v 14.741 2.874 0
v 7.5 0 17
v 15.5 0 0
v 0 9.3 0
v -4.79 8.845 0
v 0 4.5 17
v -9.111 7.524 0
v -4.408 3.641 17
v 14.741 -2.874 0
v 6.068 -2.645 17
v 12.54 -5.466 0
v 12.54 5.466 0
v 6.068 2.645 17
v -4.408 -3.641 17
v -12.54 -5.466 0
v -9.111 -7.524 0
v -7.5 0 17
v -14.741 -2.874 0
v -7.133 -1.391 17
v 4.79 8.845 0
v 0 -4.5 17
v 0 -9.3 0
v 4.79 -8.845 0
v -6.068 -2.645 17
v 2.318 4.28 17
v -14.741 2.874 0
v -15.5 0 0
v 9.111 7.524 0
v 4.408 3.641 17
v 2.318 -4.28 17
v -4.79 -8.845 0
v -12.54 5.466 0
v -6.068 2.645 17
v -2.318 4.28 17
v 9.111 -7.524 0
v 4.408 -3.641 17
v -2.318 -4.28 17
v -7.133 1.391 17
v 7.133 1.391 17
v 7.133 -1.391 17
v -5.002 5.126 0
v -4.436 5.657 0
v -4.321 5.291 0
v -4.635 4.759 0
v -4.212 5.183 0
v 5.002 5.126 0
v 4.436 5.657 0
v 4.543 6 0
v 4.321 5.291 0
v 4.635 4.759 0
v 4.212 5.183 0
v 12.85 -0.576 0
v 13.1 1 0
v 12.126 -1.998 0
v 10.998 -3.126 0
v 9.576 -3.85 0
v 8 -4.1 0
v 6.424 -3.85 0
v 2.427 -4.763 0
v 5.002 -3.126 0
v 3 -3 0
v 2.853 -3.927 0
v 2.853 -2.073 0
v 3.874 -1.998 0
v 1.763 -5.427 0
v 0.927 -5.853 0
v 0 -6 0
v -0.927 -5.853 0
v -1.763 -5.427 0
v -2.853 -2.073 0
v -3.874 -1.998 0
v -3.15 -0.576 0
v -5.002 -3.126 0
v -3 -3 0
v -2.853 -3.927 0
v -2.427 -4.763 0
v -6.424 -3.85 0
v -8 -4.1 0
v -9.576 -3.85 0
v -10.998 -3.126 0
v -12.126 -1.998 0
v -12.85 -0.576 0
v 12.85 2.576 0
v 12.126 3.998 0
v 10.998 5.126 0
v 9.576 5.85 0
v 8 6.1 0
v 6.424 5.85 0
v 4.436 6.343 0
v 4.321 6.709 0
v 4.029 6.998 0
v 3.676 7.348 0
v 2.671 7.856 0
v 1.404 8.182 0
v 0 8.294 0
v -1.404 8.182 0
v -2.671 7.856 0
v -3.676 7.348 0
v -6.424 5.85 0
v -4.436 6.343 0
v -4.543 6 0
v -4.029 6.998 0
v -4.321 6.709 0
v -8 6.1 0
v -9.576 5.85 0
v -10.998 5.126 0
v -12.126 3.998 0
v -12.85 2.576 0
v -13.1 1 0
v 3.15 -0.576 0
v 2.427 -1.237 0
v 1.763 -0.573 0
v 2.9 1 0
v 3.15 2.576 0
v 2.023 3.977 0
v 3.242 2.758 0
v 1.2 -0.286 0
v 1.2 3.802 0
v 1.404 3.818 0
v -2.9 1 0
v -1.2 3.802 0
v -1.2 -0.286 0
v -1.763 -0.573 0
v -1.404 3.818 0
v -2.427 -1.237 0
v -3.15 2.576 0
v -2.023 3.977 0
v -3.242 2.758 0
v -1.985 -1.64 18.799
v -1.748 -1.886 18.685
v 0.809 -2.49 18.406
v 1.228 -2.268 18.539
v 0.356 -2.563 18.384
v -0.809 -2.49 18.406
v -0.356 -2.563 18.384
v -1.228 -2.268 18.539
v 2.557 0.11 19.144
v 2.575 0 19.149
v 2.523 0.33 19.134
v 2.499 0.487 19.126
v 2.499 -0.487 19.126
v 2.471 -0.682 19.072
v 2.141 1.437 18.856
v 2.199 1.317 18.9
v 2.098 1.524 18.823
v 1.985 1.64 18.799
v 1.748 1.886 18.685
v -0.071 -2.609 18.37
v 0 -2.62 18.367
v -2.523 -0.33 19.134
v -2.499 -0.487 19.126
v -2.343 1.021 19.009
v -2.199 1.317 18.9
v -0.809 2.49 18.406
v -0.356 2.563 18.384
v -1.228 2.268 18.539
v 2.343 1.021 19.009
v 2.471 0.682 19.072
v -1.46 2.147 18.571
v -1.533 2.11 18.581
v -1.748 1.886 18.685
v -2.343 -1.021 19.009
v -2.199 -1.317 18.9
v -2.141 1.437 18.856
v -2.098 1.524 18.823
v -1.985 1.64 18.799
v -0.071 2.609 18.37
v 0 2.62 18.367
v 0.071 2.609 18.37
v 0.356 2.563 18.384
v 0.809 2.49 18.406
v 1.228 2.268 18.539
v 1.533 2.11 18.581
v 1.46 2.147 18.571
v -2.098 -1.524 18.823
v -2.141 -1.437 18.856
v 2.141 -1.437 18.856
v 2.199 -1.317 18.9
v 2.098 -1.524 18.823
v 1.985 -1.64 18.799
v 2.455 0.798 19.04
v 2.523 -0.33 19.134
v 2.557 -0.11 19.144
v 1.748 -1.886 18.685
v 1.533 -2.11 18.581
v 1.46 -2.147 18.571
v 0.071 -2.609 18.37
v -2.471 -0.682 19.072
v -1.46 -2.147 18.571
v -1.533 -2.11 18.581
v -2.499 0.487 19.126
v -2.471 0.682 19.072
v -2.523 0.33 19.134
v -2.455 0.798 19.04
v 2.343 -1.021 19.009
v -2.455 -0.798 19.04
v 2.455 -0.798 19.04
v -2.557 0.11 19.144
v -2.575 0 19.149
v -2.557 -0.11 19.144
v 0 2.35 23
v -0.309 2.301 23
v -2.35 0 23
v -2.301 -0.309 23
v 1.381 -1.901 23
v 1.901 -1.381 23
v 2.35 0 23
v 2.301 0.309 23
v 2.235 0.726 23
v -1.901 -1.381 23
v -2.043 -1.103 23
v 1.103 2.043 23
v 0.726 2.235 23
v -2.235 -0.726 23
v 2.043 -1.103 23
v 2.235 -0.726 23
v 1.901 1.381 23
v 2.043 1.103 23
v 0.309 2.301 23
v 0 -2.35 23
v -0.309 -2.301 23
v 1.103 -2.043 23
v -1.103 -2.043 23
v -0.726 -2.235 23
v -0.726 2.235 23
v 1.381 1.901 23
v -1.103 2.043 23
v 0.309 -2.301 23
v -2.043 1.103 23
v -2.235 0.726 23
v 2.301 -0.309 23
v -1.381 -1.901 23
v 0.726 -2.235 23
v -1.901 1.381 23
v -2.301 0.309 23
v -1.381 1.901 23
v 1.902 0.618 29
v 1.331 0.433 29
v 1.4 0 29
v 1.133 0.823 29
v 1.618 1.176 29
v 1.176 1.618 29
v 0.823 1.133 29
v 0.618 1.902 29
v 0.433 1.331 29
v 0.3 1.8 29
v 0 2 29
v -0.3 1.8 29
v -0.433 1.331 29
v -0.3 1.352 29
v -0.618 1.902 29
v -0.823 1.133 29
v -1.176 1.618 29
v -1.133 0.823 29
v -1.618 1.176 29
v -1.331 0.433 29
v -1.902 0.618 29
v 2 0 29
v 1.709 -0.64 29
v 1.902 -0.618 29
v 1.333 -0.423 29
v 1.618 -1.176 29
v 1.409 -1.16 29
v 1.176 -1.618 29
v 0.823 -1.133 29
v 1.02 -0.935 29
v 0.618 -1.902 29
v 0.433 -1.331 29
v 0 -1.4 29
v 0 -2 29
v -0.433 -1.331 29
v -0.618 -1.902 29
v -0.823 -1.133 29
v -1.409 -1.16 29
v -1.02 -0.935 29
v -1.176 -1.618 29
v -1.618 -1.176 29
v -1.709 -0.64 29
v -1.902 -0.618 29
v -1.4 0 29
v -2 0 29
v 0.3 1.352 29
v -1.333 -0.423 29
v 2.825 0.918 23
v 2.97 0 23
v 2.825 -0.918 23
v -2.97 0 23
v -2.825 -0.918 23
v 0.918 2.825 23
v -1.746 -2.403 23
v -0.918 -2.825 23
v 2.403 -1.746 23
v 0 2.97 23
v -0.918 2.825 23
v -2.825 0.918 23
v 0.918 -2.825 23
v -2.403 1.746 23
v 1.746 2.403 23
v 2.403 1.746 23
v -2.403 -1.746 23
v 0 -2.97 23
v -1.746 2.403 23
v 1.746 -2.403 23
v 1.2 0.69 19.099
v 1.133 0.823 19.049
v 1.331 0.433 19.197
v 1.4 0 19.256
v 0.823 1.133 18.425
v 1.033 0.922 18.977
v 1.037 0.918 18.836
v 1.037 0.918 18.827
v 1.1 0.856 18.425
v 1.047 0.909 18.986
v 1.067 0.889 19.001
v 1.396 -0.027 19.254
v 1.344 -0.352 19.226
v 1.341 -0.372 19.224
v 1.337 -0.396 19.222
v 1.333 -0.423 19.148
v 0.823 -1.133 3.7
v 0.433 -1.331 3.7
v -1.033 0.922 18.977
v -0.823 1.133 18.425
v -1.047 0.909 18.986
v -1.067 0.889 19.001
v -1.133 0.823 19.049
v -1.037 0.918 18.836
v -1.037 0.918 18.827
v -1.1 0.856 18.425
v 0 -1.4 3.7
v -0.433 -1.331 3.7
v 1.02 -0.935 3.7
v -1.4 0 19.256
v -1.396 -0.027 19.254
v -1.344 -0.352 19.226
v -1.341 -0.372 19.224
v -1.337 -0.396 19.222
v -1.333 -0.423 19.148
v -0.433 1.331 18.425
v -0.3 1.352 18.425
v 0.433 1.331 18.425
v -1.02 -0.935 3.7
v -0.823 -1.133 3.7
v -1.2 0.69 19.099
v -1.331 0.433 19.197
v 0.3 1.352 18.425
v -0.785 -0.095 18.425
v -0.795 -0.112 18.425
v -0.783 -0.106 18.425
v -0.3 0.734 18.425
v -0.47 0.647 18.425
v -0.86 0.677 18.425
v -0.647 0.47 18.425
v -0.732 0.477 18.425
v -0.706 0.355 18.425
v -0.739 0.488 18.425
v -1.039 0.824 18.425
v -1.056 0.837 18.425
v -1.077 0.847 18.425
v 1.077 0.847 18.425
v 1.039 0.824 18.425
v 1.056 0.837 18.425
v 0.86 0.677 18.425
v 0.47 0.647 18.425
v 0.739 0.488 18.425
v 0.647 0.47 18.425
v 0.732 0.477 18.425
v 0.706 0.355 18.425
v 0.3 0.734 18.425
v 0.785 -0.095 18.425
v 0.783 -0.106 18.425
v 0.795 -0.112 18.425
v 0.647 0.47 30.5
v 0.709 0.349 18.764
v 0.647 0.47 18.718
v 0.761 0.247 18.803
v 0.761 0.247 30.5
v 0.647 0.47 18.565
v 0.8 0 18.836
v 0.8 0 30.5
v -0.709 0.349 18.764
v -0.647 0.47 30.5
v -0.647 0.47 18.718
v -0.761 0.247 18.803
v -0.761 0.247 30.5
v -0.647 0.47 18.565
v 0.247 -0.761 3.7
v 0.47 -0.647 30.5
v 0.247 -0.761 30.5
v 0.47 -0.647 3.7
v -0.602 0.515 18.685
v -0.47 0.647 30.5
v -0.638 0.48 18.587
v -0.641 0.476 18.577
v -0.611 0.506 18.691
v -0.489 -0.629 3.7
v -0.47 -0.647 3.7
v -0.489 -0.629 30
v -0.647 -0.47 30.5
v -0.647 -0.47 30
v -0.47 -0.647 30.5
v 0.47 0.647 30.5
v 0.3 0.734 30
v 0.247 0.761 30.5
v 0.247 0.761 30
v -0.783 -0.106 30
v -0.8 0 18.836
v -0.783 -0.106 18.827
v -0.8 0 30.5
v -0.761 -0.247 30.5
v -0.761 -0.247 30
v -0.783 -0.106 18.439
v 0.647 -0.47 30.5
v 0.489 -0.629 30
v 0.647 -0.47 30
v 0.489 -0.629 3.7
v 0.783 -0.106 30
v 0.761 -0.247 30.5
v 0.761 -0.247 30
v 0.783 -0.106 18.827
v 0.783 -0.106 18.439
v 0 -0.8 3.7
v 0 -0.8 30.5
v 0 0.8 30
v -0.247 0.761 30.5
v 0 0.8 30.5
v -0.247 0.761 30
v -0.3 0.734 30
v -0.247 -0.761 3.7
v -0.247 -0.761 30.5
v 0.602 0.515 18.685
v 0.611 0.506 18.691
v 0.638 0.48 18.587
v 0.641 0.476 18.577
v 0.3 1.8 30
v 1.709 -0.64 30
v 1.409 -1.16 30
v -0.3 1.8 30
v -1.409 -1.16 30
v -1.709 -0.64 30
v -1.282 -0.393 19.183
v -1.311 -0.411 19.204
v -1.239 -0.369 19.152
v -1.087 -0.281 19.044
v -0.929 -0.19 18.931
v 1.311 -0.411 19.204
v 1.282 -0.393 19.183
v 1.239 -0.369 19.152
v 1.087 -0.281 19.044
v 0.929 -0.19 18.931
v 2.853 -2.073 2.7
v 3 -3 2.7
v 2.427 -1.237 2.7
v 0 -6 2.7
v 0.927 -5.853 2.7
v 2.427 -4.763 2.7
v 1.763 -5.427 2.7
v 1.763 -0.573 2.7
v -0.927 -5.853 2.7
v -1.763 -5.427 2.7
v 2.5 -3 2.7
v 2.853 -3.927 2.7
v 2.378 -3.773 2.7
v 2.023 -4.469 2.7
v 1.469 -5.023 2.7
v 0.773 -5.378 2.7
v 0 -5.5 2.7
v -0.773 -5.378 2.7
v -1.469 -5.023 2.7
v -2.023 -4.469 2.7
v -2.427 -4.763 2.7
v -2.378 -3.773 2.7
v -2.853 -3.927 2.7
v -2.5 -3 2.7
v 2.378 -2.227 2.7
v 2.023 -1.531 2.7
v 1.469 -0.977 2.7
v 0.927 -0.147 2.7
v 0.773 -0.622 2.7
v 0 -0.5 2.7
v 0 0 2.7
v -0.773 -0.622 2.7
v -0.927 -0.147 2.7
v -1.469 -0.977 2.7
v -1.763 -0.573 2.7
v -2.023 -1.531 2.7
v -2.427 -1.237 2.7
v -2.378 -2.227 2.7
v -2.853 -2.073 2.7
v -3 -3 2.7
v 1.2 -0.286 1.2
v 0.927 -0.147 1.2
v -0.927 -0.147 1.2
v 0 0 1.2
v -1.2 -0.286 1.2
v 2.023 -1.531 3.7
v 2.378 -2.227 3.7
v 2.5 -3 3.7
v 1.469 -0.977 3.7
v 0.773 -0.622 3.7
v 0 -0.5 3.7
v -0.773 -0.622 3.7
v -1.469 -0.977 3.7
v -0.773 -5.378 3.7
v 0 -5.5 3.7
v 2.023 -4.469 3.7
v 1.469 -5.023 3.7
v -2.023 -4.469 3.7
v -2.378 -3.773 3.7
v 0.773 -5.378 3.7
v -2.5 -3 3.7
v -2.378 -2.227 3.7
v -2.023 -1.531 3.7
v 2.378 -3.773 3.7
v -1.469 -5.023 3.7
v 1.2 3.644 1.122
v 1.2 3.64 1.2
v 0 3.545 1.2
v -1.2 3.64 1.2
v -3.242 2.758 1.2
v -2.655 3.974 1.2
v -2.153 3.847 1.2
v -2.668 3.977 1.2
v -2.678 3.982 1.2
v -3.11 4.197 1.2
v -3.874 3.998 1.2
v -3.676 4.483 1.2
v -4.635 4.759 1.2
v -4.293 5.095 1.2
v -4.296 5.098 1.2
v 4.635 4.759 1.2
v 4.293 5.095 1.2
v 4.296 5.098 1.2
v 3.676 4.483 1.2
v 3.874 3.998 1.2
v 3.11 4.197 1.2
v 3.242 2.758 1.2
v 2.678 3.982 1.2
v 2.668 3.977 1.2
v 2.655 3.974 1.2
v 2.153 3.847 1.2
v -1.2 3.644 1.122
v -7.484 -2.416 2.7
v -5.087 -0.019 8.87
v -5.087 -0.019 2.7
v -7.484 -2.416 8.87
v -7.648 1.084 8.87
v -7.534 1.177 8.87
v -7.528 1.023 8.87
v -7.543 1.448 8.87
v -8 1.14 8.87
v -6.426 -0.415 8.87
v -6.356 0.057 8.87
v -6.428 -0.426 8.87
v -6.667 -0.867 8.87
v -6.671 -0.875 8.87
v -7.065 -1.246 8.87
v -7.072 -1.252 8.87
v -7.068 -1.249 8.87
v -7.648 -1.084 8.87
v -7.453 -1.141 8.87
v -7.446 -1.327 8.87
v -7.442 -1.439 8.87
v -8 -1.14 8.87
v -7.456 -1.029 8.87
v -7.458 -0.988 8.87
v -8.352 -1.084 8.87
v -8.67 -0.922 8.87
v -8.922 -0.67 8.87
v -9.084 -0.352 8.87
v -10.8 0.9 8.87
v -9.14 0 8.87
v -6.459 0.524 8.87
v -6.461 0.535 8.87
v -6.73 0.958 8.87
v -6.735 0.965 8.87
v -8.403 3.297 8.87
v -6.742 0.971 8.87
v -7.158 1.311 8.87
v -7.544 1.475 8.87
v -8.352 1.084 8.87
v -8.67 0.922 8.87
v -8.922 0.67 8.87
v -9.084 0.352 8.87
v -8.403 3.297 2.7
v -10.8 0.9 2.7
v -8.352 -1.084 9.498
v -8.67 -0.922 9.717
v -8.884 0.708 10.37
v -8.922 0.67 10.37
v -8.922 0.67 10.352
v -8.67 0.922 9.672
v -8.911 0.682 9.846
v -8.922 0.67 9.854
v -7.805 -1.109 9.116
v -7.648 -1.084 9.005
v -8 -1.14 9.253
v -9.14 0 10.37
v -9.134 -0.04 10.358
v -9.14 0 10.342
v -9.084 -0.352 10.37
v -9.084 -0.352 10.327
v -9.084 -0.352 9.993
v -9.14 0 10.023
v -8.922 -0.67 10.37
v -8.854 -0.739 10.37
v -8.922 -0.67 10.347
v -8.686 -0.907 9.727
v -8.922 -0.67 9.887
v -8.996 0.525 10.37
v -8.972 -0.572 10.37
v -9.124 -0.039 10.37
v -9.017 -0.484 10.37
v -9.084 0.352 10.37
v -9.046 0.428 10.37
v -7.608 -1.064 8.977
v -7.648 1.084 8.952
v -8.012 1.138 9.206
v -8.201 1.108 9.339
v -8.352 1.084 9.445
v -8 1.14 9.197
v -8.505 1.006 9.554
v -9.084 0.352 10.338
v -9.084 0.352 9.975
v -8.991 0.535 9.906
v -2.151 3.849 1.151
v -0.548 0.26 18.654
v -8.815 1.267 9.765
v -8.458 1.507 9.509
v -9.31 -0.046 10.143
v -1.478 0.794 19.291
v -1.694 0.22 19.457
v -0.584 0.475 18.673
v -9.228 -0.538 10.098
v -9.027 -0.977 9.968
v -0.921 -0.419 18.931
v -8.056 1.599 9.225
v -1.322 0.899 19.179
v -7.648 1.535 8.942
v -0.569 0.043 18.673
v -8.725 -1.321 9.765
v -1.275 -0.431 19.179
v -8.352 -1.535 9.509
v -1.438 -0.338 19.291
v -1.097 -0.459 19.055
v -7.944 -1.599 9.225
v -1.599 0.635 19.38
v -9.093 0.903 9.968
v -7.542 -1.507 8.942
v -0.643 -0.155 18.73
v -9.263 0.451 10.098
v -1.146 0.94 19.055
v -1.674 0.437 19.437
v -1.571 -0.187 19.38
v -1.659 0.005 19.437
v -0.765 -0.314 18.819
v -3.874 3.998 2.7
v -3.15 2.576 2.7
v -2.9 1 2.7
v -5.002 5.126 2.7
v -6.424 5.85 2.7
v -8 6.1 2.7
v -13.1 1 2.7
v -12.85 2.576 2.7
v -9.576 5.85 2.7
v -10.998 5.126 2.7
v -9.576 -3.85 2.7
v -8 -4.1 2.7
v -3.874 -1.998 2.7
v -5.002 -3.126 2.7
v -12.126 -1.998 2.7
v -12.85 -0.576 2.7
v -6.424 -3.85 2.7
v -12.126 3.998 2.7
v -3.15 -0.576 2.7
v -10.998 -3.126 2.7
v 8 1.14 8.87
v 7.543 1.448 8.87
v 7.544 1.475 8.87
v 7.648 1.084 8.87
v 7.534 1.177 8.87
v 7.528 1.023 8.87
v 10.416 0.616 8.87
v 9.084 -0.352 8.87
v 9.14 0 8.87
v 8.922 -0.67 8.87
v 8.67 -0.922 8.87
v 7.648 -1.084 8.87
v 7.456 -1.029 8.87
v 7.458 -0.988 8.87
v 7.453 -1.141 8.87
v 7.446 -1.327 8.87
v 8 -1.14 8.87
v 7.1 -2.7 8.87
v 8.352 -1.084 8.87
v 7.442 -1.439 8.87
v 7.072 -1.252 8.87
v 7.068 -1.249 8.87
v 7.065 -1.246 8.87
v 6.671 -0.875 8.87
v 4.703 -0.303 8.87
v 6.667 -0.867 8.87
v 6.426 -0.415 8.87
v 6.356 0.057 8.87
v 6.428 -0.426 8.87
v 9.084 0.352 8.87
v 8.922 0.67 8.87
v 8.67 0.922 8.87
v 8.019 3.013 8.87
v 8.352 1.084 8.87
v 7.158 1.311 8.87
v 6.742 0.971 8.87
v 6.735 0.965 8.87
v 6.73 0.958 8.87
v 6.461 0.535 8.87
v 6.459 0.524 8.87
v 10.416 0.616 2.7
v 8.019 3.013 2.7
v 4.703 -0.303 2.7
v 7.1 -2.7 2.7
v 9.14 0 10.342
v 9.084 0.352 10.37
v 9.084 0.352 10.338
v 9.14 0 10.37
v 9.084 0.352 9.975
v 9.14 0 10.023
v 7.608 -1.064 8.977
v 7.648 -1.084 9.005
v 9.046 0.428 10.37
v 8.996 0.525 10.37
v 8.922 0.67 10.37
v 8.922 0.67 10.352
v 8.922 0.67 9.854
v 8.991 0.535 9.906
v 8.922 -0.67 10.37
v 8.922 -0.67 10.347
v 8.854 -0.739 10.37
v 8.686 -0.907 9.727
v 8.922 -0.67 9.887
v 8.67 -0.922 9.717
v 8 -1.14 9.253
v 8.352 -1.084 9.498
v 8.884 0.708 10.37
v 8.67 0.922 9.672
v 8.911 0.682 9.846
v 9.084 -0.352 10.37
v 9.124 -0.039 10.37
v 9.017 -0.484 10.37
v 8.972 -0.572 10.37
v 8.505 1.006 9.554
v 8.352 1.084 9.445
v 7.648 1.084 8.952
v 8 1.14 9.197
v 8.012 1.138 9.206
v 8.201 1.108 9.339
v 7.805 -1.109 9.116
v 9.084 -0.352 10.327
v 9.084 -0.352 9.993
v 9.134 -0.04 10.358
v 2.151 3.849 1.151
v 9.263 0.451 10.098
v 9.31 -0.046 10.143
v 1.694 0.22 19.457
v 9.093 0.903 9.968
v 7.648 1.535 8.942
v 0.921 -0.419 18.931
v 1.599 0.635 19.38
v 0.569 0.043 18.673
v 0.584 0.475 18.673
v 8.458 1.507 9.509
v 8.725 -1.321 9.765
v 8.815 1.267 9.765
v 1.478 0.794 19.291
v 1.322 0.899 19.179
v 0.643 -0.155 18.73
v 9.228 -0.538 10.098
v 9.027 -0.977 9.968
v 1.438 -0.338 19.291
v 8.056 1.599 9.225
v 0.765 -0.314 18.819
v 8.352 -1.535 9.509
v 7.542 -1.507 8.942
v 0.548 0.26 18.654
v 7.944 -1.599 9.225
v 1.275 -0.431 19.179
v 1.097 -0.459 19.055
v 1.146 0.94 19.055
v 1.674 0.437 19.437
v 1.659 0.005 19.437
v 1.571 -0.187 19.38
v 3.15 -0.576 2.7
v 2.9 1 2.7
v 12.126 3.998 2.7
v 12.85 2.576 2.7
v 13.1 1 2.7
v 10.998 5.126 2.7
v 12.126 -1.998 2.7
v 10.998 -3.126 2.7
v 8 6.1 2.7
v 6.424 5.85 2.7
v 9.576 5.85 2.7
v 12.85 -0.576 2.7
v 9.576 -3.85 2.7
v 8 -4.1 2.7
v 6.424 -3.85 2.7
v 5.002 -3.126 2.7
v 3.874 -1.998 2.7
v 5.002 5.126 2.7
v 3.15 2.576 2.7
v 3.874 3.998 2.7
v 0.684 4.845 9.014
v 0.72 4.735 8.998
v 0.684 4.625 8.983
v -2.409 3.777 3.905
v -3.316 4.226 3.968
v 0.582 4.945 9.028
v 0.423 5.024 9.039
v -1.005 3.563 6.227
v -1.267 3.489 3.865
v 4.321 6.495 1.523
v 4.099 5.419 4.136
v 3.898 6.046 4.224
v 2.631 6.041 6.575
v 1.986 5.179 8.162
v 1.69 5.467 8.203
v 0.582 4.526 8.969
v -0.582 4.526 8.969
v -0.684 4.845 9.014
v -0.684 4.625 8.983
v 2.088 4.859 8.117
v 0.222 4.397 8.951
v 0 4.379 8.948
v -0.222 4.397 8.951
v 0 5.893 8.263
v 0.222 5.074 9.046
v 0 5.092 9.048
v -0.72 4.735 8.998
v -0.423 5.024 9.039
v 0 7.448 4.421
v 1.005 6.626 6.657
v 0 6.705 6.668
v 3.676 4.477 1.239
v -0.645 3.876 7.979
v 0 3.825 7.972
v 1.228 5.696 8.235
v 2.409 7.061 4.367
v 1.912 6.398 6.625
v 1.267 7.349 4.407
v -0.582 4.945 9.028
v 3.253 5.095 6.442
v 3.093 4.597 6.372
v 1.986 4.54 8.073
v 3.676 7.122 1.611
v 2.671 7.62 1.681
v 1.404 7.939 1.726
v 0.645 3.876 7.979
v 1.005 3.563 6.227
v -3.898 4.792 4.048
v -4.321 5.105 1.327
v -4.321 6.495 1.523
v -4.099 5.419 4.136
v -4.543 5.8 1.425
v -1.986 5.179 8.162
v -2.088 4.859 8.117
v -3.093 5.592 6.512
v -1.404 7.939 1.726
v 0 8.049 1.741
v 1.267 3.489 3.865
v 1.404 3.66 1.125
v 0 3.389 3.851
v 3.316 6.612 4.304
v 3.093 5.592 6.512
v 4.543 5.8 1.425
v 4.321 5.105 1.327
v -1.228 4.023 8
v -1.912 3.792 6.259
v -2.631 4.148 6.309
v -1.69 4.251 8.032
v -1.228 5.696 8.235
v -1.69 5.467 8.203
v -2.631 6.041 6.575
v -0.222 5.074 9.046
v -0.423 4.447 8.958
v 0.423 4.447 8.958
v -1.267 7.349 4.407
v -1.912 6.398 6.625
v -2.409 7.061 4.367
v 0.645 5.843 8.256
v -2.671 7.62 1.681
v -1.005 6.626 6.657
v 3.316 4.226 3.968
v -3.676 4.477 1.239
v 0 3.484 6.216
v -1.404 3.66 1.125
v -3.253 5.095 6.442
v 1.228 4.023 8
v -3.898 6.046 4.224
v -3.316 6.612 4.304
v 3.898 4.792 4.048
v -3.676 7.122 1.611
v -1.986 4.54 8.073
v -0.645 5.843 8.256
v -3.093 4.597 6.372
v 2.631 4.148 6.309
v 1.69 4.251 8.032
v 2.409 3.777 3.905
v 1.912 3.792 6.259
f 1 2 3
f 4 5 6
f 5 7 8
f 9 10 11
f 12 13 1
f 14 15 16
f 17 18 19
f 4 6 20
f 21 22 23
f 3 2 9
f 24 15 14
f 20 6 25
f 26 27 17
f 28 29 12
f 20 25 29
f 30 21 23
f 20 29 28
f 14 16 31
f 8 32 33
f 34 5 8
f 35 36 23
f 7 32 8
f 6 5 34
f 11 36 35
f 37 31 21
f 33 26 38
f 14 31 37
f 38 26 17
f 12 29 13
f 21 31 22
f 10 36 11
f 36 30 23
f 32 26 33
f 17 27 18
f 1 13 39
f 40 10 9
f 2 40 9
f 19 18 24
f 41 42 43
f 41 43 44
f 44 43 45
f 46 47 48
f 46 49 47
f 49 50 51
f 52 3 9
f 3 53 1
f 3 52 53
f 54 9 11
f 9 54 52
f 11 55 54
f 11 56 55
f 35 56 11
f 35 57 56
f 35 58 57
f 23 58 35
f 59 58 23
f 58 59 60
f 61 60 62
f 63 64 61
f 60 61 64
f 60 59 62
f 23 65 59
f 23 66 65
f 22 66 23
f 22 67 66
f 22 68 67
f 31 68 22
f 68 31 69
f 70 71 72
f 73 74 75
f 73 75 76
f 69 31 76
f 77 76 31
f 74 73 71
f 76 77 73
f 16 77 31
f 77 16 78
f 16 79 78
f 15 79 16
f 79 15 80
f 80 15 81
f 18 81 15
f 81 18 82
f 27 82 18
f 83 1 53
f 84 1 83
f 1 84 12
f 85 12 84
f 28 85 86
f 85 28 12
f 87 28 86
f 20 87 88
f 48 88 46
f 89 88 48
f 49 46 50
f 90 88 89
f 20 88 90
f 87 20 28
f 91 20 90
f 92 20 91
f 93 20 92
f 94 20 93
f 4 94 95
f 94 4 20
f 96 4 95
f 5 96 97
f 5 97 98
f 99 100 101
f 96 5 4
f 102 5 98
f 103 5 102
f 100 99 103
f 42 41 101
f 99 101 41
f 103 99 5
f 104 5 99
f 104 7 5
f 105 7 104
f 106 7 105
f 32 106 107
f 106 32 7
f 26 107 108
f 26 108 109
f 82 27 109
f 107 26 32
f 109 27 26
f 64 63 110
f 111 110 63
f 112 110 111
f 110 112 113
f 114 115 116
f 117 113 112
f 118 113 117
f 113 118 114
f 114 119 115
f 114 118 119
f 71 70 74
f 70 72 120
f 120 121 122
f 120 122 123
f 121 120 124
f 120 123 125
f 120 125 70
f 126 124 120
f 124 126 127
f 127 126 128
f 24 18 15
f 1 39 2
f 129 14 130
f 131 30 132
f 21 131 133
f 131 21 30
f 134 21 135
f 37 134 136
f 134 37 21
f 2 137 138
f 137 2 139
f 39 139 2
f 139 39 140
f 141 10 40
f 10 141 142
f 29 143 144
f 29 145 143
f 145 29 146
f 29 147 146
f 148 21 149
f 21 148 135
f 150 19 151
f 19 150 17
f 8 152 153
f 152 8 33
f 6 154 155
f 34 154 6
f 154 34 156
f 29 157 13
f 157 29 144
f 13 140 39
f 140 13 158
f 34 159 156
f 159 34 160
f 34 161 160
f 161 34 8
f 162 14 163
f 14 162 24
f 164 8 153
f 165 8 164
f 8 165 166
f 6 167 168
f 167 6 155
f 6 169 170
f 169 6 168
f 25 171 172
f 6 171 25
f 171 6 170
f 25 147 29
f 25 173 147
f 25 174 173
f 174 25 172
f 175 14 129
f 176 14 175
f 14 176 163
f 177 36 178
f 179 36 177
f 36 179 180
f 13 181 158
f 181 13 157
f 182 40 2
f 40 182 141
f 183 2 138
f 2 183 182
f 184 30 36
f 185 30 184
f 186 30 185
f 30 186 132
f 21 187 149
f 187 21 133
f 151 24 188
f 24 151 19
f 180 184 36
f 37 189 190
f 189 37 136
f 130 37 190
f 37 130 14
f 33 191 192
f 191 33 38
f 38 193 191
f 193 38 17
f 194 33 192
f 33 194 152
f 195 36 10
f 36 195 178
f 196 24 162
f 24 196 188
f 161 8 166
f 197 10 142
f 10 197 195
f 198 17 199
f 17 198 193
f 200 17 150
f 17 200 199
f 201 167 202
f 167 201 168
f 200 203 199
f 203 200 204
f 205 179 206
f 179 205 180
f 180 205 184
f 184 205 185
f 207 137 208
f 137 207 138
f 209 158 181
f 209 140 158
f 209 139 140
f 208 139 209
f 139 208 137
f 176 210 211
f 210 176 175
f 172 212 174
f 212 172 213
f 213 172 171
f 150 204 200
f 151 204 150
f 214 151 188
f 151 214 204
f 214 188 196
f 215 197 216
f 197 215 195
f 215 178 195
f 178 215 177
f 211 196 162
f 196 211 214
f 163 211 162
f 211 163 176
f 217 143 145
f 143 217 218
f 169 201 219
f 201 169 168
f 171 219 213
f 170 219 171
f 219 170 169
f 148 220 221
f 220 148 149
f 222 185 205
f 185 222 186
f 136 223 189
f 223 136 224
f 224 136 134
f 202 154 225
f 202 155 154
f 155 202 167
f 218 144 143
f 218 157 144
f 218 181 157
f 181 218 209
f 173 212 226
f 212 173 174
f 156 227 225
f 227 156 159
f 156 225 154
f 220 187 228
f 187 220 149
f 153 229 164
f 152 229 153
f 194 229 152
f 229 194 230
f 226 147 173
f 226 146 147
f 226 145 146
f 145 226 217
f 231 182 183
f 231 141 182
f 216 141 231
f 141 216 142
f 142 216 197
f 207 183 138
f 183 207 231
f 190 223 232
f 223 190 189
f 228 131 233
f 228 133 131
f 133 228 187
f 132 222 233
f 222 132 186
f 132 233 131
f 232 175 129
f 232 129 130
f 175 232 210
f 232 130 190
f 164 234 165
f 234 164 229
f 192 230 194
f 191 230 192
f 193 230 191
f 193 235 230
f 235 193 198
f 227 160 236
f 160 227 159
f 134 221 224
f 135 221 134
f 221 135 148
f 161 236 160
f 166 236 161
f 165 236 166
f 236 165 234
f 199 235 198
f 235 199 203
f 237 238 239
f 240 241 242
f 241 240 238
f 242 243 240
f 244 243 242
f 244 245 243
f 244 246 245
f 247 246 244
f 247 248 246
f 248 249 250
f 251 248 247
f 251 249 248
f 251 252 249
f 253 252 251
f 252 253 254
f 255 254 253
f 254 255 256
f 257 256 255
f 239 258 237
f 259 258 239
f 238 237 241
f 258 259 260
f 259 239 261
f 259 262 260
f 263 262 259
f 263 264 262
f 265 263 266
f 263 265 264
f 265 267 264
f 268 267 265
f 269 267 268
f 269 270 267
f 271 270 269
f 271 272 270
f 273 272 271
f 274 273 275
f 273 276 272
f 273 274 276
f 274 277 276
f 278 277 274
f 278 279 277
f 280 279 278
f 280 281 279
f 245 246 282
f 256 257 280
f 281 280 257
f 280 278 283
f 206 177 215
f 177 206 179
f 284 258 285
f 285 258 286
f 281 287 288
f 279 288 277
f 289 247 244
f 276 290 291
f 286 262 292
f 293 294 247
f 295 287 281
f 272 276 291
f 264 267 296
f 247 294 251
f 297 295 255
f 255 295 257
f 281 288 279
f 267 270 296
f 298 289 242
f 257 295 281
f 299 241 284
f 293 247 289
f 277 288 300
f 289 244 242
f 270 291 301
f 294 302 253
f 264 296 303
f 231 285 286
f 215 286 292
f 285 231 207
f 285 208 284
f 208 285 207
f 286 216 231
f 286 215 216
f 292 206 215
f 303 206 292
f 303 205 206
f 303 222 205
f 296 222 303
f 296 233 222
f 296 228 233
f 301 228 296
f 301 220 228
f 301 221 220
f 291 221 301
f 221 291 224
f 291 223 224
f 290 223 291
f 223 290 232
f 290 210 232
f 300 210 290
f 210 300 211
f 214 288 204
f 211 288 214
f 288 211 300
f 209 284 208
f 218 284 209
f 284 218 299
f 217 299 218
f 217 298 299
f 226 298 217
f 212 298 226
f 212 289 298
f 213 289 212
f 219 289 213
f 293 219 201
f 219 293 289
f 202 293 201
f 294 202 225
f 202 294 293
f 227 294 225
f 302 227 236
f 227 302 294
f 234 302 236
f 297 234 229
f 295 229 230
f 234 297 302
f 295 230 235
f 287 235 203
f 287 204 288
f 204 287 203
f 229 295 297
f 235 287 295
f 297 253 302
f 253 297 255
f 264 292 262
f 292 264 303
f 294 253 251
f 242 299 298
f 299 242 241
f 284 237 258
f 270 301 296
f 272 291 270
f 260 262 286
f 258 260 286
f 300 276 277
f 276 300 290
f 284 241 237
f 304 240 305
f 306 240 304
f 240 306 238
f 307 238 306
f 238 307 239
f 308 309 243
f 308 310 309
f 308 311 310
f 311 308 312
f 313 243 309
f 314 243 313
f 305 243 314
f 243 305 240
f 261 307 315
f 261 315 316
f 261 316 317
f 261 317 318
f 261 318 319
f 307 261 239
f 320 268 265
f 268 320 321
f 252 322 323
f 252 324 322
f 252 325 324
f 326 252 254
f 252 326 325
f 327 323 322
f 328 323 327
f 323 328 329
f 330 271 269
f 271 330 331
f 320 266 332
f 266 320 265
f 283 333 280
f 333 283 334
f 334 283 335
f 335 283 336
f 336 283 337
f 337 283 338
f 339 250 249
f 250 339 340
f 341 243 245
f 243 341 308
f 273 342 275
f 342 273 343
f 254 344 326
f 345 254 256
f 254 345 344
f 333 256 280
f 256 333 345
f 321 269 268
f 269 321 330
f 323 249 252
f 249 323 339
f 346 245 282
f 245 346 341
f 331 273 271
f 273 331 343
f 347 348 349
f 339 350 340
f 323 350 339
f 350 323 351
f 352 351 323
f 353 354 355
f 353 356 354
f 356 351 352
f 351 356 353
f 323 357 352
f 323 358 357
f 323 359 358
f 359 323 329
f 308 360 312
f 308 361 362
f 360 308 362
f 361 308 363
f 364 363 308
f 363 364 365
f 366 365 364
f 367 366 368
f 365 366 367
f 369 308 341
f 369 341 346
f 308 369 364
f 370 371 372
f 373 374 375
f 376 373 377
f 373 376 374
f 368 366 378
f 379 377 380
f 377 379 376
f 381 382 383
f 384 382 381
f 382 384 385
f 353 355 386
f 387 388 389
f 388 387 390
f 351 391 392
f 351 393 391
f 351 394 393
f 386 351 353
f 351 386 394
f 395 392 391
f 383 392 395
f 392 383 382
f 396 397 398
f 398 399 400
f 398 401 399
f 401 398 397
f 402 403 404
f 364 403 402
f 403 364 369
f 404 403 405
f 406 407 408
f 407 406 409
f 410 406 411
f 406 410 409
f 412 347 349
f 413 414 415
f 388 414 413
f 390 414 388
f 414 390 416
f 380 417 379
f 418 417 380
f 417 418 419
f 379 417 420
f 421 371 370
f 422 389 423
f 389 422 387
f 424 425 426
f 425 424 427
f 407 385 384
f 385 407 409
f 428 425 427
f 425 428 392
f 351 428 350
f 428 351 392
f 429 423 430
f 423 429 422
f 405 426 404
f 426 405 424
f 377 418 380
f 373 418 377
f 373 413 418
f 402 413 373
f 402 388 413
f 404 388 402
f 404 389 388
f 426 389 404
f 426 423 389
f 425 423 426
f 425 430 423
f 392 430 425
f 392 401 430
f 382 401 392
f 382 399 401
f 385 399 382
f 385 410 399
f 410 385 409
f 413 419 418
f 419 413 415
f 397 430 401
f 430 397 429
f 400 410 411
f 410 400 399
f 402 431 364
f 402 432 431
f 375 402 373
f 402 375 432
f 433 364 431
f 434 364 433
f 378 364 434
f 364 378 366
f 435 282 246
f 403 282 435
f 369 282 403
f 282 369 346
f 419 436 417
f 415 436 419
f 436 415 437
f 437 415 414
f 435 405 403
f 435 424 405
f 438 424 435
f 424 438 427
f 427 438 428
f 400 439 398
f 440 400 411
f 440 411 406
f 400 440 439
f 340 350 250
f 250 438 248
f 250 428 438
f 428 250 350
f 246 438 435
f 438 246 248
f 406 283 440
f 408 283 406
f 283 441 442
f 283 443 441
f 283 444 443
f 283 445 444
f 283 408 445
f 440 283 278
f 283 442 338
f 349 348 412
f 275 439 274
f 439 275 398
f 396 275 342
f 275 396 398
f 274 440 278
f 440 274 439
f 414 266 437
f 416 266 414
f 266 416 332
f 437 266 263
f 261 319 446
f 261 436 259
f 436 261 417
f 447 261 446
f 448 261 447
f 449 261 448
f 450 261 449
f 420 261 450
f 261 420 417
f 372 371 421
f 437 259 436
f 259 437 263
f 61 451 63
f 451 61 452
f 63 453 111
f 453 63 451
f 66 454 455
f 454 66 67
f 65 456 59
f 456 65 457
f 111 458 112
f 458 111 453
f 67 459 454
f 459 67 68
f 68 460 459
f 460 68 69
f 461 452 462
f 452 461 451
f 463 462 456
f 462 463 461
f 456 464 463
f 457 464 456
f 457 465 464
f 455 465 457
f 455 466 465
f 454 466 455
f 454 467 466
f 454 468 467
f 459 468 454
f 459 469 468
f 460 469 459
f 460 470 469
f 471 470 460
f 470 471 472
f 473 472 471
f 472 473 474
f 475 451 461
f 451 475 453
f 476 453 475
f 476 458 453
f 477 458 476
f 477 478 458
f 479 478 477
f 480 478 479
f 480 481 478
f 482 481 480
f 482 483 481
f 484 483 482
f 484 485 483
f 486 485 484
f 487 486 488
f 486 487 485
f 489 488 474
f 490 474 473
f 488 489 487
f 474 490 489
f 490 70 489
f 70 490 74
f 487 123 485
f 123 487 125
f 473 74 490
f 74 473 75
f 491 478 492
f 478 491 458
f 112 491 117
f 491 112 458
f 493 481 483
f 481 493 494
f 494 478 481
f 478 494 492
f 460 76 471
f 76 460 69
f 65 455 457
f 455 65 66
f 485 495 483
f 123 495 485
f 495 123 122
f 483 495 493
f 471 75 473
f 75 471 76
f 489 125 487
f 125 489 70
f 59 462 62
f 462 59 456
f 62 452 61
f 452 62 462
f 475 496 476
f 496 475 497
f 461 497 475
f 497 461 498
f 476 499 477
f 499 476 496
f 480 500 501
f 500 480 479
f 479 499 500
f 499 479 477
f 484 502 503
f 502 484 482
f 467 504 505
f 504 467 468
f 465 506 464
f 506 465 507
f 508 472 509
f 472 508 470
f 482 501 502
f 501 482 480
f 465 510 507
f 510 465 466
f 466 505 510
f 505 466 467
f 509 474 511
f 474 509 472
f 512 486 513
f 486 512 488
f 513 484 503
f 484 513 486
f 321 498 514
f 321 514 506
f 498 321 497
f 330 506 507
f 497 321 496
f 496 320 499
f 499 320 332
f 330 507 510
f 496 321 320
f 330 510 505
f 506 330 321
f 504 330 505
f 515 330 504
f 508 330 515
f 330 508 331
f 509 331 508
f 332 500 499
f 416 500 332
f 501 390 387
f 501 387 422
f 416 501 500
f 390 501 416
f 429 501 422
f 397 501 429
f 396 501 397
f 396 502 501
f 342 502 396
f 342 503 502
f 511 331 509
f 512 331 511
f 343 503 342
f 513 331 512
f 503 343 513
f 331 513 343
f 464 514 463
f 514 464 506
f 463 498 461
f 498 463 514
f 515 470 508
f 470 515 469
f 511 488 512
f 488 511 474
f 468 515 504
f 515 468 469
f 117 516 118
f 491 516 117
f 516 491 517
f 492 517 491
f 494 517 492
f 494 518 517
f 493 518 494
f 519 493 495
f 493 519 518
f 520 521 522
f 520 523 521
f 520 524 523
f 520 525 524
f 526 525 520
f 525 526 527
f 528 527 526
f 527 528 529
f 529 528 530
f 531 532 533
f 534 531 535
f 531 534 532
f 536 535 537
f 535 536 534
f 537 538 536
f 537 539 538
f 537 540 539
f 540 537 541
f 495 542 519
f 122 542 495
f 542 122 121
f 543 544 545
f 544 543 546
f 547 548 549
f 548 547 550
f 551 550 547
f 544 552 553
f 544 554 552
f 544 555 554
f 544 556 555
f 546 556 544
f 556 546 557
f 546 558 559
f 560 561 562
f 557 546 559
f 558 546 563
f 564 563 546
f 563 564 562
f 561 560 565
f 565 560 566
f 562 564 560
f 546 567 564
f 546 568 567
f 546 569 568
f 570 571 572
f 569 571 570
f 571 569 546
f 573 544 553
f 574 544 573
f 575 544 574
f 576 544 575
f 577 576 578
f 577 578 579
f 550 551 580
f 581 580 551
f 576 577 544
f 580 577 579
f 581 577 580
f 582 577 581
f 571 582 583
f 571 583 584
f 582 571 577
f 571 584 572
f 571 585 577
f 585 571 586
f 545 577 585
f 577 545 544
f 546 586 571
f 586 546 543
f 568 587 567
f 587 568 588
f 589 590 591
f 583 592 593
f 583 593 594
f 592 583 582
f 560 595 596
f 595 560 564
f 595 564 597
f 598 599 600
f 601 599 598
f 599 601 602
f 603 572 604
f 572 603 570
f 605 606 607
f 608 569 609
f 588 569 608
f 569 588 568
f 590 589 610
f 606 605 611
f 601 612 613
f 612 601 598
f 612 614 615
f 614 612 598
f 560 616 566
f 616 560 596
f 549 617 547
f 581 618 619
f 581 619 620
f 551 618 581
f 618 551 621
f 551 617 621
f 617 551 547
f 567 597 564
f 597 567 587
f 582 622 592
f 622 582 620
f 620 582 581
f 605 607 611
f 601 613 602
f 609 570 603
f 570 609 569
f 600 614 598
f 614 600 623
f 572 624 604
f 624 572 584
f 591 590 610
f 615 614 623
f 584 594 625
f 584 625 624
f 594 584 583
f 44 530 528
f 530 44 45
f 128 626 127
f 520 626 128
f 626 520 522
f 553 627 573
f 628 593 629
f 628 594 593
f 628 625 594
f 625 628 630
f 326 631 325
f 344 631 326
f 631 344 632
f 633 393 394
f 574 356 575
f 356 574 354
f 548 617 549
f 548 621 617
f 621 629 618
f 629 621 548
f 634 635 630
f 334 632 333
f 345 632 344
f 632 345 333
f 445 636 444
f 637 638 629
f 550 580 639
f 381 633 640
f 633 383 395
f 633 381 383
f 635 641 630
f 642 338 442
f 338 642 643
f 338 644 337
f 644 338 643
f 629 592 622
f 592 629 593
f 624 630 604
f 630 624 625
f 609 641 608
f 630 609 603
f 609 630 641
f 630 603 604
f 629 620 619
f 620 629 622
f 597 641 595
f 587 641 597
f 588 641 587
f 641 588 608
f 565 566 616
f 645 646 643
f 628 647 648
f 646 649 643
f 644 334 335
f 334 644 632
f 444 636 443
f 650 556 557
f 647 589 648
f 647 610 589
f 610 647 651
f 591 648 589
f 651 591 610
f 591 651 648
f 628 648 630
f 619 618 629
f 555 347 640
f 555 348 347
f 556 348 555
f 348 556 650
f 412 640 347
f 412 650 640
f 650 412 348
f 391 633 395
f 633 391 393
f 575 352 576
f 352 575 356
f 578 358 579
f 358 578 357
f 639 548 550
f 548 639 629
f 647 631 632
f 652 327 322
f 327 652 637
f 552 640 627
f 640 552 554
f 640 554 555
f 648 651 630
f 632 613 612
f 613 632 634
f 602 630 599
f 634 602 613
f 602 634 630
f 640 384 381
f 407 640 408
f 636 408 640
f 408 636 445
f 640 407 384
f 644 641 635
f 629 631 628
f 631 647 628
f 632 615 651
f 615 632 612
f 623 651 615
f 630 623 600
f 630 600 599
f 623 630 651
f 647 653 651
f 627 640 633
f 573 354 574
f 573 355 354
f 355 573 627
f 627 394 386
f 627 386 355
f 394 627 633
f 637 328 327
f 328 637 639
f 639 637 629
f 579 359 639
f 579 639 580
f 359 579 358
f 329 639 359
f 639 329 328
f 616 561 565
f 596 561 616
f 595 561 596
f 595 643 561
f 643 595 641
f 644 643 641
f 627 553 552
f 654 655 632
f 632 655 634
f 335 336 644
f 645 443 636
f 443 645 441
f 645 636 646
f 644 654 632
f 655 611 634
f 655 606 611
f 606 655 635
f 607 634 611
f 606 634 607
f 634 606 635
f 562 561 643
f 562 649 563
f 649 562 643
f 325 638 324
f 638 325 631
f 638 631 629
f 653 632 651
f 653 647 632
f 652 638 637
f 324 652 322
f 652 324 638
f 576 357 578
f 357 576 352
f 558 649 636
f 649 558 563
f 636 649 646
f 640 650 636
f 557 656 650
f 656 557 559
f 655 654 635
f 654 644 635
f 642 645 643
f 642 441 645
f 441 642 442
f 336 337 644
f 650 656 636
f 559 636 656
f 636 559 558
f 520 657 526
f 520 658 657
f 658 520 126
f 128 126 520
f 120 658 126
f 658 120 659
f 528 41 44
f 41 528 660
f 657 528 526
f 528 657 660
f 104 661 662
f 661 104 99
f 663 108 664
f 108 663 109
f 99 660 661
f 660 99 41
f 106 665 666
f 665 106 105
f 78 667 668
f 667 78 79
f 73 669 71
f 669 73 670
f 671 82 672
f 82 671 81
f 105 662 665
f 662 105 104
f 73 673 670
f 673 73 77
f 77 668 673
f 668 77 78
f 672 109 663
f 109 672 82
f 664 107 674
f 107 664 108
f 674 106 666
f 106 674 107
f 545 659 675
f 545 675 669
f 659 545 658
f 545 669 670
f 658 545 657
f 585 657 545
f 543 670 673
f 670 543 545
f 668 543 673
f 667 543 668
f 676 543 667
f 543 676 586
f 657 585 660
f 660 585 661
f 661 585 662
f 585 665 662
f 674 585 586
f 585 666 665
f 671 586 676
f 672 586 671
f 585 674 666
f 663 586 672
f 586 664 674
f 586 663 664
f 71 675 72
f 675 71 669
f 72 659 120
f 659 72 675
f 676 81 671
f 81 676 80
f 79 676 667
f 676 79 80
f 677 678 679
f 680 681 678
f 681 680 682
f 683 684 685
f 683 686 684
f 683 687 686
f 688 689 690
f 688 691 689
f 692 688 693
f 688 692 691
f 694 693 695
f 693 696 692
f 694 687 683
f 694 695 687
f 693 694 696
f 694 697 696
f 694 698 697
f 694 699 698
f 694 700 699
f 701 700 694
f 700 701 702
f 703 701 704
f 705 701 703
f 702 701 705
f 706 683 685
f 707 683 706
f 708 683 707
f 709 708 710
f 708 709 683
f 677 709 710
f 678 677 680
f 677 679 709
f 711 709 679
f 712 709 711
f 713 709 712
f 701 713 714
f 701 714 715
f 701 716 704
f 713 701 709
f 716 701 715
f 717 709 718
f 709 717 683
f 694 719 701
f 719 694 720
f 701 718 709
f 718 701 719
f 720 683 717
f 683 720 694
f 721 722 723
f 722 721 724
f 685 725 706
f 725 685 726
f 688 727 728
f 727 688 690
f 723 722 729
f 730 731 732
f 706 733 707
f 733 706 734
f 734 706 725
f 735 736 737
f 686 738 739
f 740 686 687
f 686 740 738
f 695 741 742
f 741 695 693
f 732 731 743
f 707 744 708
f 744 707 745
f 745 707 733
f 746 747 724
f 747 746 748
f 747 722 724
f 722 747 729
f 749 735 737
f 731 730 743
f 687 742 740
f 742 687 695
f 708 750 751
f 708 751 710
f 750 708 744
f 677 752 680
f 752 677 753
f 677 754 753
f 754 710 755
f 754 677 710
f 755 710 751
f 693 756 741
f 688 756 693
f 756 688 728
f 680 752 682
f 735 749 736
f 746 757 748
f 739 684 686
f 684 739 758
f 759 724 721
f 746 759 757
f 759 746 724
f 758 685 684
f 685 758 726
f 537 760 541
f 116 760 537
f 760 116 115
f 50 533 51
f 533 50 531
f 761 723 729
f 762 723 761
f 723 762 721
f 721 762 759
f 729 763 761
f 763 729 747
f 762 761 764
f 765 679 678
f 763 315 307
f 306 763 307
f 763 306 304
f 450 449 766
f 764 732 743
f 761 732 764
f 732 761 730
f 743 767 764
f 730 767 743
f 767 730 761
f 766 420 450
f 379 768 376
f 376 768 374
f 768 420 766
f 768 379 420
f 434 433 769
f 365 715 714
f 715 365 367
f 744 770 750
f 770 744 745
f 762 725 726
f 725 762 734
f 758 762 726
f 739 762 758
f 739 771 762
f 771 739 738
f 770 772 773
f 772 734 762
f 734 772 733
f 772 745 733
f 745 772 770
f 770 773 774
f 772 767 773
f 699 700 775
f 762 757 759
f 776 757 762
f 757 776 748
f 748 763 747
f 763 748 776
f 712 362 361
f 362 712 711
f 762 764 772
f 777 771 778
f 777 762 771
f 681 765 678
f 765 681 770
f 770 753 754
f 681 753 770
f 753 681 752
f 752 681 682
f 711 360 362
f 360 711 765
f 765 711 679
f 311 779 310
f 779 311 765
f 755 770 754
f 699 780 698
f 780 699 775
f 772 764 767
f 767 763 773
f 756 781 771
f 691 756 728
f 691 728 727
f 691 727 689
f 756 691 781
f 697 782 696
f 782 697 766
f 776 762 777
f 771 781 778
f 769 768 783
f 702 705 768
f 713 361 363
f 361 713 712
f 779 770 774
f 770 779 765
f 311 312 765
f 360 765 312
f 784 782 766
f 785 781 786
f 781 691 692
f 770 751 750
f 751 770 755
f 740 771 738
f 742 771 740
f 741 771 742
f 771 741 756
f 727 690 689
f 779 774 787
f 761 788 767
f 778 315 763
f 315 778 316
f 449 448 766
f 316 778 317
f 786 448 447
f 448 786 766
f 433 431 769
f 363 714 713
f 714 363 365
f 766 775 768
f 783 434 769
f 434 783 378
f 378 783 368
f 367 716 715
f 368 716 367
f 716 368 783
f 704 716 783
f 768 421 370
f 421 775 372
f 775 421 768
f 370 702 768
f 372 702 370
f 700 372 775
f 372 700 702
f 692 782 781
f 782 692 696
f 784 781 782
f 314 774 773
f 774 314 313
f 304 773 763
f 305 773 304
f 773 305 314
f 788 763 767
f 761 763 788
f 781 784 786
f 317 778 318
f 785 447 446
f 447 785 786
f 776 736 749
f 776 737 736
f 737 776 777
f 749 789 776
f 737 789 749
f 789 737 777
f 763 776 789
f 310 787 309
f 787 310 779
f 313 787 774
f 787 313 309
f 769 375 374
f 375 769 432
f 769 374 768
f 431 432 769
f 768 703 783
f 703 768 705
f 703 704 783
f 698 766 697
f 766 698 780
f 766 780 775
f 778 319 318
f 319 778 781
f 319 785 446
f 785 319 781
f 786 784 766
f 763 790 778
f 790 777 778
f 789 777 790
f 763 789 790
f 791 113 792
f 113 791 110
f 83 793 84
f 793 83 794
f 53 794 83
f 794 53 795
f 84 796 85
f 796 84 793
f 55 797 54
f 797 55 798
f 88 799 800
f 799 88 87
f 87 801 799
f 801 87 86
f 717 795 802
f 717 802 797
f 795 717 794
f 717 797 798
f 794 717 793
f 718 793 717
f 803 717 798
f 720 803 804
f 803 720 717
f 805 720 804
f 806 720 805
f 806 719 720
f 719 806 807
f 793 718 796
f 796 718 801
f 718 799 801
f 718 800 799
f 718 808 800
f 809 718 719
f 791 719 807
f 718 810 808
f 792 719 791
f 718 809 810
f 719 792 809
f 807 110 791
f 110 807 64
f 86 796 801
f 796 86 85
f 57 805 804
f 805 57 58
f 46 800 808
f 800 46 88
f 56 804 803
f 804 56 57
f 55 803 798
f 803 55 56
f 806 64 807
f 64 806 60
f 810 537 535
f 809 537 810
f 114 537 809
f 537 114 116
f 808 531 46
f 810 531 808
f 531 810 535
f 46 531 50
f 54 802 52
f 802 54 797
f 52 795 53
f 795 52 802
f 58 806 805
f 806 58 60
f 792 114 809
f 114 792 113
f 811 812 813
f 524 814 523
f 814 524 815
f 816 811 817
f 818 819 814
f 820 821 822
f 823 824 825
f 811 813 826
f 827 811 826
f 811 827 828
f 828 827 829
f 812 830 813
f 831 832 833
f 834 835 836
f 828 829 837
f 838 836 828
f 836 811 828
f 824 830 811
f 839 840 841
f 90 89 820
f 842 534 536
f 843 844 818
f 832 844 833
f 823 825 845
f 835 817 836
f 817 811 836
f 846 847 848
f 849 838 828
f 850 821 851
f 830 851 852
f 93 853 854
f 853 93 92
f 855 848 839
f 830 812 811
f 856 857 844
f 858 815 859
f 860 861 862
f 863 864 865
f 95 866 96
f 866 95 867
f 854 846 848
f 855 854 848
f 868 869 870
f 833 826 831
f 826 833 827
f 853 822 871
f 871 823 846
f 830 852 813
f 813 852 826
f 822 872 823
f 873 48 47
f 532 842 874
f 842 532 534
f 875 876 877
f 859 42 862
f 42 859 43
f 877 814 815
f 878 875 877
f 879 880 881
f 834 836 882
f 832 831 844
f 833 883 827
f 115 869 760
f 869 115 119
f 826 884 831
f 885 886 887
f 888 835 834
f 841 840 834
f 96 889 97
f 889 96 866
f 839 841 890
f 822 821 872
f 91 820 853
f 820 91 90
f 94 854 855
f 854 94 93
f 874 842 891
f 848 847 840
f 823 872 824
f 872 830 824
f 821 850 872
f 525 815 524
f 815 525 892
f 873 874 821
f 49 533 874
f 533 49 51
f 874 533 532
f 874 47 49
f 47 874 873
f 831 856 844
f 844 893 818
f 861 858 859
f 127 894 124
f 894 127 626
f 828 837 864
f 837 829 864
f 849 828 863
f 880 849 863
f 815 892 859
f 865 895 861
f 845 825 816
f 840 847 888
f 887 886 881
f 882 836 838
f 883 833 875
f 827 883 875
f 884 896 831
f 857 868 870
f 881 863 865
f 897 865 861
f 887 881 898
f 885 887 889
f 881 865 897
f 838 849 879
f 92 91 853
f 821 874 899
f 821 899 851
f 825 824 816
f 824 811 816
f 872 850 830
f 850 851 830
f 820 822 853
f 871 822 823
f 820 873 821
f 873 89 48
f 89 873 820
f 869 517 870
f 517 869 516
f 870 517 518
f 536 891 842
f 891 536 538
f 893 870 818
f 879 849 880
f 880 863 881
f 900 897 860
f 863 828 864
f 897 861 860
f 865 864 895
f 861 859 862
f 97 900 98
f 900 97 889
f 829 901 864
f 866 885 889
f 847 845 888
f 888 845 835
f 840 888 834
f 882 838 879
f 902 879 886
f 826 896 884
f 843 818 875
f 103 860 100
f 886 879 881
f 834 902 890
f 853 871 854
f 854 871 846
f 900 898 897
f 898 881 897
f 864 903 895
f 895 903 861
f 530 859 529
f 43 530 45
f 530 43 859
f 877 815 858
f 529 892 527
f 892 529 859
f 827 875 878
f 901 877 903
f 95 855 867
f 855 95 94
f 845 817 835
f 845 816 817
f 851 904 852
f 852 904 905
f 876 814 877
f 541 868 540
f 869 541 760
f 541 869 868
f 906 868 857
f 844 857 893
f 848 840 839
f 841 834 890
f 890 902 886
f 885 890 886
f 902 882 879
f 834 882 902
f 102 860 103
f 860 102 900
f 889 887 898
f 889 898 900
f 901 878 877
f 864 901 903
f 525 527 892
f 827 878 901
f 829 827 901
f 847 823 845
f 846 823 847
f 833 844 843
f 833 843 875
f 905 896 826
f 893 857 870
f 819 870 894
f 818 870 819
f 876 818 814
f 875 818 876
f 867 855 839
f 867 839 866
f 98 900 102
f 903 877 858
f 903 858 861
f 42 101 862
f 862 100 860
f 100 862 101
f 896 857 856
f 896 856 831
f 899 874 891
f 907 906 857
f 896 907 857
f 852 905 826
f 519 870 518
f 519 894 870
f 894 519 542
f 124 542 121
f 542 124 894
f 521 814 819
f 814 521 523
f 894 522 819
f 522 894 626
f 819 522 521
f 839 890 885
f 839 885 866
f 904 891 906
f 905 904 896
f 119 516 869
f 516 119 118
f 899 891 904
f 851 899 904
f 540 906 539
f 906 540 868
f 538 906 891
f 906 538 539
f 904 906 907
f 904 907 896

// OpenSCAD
//use $fn=1000 for manufacturing. 
// rendering with 1K facet number is taking 8 minutes
$fn=20; 

sd=13/2 + 1;  // top of main housing:.7.5mm radius => 1 mm length end to end
ld=29/2 + 1;  // base of main housing: 15.5 mm radius => 31mm length end to end
h0=17;        // hight of main housing
ht=12;        // hight of tip from top of main housing
r1t=2.7;      // bottom radius of the tip
r2t=2;      // top radious of the tip

// make sure this fuses with tip of speaker without sharp edges.
speakerFillerH=h0*0.4956; // connection point of speaker to tip's hollow channels

//speaker(1);
//speaker(-1);
//speaker2();
draw2();
//drawWithCut();
//drawInner();
// Change translate params to see inner parts.
module drawWithCut()
{
    difference()
    {
        draw2();
        translate([-50, 0, 0])
            //translate([8,0,0])
            cube([100, 50, 50]);
    }
}

module speaker1(n=1)
{
    // Speaker ref: https://www.knowles.com/docs/default-source/model-downloads/tec-30033-000.pdf
    // Dimensions: main: 7.87x4.09x2.79 box. with a cylinder tip of:1.60 hight and radius slightly less than 1.14. Top cylinder is on the edge, 
    //     we will model as:
    //     lower body for main box: main +0.3mm
    //     upper body for tip:      h:2mm x and y are -0.3mm
    mic1Tolerance = 0.6;
    mic1H = 7.87;
    mic1L = 4.09 + mic1Tolerance;
    mic1W = 2.79 + mic1Tolerance;

    //translate([-mic1L/2,-mic1W/2+0.5,0])
    union()
    {
      translate([-0.9+1.9*(n-1)/2,-2.7-3.6*(n-1)/2,0])
        rotate([0,0,45*n])
        cube([mic1L, mic1W, mic1H + 1]);
      translate([0,0,mic1H])
         cylinder(h = 2.5, r1 = 1.14, r2 = 1.14);

        // Add cable routing. distance between cables is 1.94. add 2.5 mm routing space
    translate([-4*n+0.2*(1-n)/2, 2+0.1*(1-n), 0])
    rotate([0,0,45])
      cube([4-(n+1)*0.8, 2.4+(n+1)*0.8, 1.2]);
}
}

module speaker2()
{      
 // add 10mm diameter housing for round speakers. so that this housing can hold both round and rectangular type speakers
  cylinder(h = 2.7, r1 = 5.1, r2 = 5.1);
}

module speaker(n= 1)
{
    displacement = 8 * n;
    //intersection()
    union()
  {
    translate([8*n, 0, 0])
      speaker1(n);
    
    translate([displacement, 0, speakerFillerH + 0.8])
    rotate([0, -90 *n+55*n, -2*n])
      cylinder(12, r1 = 1.6, r2 = 0.7);
    
      translate([8*n,1,0])  
    speaker2();
    }
}
;

// Draws inner parts of the assembly. Some 'removed' parts are drawn solid to demonstrate how it works.
module drawInner()
{
    difference(){
    tipHole();
    tipInner();
    }
//tipWall(0);
tipWall(1);
tipWall(2);
speakerFiller(0);
speakerFiller(1);
micHousing();
    speaker(-1);
    speaker(1);
}

module drawInner2()
{
    difference()
    {
    union()
    {
    difference()
    {
    tipHole();
    tipInner();
    }
tipWall(0);
tipWall(1);
tipWall(2);
speakerFiller(0);
speakerFiller(1);
}
micHousing();
    speaker(-1);
    speaker(1);
}
}

module draw2()
{
difference() {
    drawMain_Tubes_MicTubeAllTheWay_SpeakerTubeHalfWay();
    micHousing();
    speaker(-1);
    speaker(1);
    cableSpace();
    } 
}

module drawMain_Tubes_MicTubeAllTheWay_SpeakerTubeHalfWay()
{
union()
{
difference()
    {
  mainBlock();
  tipHole();
}
tipInner();
tipWall(0);
tipWall(1);
tipWall(2);
speakerFiller(0);
speakerFiller(1);
}
}

module cableSpace()
{
    translate([0,6,0])
    rotate([8,0,0])
    scale([1,0.5,2])
       sphere(r=4.6);
}
  
module mainBlock()
{
 union()
 {
    scale([1,0.6,1]) 
    cylinder(h=h0, r1=ld, r2=sd); 
    
    translate([0,0,h0])
    scale([1,0.6,1]) 
    cylinder(h=ht/5, r1=sd, r2=r2t); 

    translate([0,0,h0])
        cylinder(h=ht, r1=r1t, r2=r2t); 
    translate([0,0,h0+ht/2])
        cylinder(h=ht/2, r1=r1t*1.1, r2=r2t);
}
};

module micHousing()
{
  translate([0,-3,0])
    {
  // 2.7mm height, 6mm diameter    
  cylinder(2.7,3,3);

  // chamber with slightly more hight
  cylinder(3.7,2.5,2.5);
    
  // cable route
  translate([-1.2,0,0])
  cube([2.4,8,1.2]);
    }
};

// Blocks to close 2 speaker's hollow inner channel connection to microphone housing.
module speakerFiller(n=0)
{
    hf=10;
union()
    {
    rotate(n*120)
    cube([r2t,r2t,speakerFillerH+hf]);
    rotate(n*120-30)
    cube([r2t,r2t,speakerFillerH+hf]);
    }
};


// the wall width at the top of the tip is 0.3*r2t=0.6 mm. is this too small? 
module tipHole()
{
  cylinder(h=h0+ht+1.5,r1=r2t*0.7,r2=r2t*0.7);
};

// inner tip. smallest dimension. r=0.8 mm. 1.6mm radius.
module tipInner()
{
  cylinder(h=h0+ht+1.5,r1=r2t*0.4,r2=r2t*0.4);
};

// tip wall width is 0.6 mm. should be ok.
// tip wall length is 1.5*.9=1.35 mm.
module tipWall(n=0)
{
    ww=0.6;
    rotate(n*120)
    translate([-ww/2,0,0])
    cube([ww,r2t*0.9,h0+ht+1]);
}
